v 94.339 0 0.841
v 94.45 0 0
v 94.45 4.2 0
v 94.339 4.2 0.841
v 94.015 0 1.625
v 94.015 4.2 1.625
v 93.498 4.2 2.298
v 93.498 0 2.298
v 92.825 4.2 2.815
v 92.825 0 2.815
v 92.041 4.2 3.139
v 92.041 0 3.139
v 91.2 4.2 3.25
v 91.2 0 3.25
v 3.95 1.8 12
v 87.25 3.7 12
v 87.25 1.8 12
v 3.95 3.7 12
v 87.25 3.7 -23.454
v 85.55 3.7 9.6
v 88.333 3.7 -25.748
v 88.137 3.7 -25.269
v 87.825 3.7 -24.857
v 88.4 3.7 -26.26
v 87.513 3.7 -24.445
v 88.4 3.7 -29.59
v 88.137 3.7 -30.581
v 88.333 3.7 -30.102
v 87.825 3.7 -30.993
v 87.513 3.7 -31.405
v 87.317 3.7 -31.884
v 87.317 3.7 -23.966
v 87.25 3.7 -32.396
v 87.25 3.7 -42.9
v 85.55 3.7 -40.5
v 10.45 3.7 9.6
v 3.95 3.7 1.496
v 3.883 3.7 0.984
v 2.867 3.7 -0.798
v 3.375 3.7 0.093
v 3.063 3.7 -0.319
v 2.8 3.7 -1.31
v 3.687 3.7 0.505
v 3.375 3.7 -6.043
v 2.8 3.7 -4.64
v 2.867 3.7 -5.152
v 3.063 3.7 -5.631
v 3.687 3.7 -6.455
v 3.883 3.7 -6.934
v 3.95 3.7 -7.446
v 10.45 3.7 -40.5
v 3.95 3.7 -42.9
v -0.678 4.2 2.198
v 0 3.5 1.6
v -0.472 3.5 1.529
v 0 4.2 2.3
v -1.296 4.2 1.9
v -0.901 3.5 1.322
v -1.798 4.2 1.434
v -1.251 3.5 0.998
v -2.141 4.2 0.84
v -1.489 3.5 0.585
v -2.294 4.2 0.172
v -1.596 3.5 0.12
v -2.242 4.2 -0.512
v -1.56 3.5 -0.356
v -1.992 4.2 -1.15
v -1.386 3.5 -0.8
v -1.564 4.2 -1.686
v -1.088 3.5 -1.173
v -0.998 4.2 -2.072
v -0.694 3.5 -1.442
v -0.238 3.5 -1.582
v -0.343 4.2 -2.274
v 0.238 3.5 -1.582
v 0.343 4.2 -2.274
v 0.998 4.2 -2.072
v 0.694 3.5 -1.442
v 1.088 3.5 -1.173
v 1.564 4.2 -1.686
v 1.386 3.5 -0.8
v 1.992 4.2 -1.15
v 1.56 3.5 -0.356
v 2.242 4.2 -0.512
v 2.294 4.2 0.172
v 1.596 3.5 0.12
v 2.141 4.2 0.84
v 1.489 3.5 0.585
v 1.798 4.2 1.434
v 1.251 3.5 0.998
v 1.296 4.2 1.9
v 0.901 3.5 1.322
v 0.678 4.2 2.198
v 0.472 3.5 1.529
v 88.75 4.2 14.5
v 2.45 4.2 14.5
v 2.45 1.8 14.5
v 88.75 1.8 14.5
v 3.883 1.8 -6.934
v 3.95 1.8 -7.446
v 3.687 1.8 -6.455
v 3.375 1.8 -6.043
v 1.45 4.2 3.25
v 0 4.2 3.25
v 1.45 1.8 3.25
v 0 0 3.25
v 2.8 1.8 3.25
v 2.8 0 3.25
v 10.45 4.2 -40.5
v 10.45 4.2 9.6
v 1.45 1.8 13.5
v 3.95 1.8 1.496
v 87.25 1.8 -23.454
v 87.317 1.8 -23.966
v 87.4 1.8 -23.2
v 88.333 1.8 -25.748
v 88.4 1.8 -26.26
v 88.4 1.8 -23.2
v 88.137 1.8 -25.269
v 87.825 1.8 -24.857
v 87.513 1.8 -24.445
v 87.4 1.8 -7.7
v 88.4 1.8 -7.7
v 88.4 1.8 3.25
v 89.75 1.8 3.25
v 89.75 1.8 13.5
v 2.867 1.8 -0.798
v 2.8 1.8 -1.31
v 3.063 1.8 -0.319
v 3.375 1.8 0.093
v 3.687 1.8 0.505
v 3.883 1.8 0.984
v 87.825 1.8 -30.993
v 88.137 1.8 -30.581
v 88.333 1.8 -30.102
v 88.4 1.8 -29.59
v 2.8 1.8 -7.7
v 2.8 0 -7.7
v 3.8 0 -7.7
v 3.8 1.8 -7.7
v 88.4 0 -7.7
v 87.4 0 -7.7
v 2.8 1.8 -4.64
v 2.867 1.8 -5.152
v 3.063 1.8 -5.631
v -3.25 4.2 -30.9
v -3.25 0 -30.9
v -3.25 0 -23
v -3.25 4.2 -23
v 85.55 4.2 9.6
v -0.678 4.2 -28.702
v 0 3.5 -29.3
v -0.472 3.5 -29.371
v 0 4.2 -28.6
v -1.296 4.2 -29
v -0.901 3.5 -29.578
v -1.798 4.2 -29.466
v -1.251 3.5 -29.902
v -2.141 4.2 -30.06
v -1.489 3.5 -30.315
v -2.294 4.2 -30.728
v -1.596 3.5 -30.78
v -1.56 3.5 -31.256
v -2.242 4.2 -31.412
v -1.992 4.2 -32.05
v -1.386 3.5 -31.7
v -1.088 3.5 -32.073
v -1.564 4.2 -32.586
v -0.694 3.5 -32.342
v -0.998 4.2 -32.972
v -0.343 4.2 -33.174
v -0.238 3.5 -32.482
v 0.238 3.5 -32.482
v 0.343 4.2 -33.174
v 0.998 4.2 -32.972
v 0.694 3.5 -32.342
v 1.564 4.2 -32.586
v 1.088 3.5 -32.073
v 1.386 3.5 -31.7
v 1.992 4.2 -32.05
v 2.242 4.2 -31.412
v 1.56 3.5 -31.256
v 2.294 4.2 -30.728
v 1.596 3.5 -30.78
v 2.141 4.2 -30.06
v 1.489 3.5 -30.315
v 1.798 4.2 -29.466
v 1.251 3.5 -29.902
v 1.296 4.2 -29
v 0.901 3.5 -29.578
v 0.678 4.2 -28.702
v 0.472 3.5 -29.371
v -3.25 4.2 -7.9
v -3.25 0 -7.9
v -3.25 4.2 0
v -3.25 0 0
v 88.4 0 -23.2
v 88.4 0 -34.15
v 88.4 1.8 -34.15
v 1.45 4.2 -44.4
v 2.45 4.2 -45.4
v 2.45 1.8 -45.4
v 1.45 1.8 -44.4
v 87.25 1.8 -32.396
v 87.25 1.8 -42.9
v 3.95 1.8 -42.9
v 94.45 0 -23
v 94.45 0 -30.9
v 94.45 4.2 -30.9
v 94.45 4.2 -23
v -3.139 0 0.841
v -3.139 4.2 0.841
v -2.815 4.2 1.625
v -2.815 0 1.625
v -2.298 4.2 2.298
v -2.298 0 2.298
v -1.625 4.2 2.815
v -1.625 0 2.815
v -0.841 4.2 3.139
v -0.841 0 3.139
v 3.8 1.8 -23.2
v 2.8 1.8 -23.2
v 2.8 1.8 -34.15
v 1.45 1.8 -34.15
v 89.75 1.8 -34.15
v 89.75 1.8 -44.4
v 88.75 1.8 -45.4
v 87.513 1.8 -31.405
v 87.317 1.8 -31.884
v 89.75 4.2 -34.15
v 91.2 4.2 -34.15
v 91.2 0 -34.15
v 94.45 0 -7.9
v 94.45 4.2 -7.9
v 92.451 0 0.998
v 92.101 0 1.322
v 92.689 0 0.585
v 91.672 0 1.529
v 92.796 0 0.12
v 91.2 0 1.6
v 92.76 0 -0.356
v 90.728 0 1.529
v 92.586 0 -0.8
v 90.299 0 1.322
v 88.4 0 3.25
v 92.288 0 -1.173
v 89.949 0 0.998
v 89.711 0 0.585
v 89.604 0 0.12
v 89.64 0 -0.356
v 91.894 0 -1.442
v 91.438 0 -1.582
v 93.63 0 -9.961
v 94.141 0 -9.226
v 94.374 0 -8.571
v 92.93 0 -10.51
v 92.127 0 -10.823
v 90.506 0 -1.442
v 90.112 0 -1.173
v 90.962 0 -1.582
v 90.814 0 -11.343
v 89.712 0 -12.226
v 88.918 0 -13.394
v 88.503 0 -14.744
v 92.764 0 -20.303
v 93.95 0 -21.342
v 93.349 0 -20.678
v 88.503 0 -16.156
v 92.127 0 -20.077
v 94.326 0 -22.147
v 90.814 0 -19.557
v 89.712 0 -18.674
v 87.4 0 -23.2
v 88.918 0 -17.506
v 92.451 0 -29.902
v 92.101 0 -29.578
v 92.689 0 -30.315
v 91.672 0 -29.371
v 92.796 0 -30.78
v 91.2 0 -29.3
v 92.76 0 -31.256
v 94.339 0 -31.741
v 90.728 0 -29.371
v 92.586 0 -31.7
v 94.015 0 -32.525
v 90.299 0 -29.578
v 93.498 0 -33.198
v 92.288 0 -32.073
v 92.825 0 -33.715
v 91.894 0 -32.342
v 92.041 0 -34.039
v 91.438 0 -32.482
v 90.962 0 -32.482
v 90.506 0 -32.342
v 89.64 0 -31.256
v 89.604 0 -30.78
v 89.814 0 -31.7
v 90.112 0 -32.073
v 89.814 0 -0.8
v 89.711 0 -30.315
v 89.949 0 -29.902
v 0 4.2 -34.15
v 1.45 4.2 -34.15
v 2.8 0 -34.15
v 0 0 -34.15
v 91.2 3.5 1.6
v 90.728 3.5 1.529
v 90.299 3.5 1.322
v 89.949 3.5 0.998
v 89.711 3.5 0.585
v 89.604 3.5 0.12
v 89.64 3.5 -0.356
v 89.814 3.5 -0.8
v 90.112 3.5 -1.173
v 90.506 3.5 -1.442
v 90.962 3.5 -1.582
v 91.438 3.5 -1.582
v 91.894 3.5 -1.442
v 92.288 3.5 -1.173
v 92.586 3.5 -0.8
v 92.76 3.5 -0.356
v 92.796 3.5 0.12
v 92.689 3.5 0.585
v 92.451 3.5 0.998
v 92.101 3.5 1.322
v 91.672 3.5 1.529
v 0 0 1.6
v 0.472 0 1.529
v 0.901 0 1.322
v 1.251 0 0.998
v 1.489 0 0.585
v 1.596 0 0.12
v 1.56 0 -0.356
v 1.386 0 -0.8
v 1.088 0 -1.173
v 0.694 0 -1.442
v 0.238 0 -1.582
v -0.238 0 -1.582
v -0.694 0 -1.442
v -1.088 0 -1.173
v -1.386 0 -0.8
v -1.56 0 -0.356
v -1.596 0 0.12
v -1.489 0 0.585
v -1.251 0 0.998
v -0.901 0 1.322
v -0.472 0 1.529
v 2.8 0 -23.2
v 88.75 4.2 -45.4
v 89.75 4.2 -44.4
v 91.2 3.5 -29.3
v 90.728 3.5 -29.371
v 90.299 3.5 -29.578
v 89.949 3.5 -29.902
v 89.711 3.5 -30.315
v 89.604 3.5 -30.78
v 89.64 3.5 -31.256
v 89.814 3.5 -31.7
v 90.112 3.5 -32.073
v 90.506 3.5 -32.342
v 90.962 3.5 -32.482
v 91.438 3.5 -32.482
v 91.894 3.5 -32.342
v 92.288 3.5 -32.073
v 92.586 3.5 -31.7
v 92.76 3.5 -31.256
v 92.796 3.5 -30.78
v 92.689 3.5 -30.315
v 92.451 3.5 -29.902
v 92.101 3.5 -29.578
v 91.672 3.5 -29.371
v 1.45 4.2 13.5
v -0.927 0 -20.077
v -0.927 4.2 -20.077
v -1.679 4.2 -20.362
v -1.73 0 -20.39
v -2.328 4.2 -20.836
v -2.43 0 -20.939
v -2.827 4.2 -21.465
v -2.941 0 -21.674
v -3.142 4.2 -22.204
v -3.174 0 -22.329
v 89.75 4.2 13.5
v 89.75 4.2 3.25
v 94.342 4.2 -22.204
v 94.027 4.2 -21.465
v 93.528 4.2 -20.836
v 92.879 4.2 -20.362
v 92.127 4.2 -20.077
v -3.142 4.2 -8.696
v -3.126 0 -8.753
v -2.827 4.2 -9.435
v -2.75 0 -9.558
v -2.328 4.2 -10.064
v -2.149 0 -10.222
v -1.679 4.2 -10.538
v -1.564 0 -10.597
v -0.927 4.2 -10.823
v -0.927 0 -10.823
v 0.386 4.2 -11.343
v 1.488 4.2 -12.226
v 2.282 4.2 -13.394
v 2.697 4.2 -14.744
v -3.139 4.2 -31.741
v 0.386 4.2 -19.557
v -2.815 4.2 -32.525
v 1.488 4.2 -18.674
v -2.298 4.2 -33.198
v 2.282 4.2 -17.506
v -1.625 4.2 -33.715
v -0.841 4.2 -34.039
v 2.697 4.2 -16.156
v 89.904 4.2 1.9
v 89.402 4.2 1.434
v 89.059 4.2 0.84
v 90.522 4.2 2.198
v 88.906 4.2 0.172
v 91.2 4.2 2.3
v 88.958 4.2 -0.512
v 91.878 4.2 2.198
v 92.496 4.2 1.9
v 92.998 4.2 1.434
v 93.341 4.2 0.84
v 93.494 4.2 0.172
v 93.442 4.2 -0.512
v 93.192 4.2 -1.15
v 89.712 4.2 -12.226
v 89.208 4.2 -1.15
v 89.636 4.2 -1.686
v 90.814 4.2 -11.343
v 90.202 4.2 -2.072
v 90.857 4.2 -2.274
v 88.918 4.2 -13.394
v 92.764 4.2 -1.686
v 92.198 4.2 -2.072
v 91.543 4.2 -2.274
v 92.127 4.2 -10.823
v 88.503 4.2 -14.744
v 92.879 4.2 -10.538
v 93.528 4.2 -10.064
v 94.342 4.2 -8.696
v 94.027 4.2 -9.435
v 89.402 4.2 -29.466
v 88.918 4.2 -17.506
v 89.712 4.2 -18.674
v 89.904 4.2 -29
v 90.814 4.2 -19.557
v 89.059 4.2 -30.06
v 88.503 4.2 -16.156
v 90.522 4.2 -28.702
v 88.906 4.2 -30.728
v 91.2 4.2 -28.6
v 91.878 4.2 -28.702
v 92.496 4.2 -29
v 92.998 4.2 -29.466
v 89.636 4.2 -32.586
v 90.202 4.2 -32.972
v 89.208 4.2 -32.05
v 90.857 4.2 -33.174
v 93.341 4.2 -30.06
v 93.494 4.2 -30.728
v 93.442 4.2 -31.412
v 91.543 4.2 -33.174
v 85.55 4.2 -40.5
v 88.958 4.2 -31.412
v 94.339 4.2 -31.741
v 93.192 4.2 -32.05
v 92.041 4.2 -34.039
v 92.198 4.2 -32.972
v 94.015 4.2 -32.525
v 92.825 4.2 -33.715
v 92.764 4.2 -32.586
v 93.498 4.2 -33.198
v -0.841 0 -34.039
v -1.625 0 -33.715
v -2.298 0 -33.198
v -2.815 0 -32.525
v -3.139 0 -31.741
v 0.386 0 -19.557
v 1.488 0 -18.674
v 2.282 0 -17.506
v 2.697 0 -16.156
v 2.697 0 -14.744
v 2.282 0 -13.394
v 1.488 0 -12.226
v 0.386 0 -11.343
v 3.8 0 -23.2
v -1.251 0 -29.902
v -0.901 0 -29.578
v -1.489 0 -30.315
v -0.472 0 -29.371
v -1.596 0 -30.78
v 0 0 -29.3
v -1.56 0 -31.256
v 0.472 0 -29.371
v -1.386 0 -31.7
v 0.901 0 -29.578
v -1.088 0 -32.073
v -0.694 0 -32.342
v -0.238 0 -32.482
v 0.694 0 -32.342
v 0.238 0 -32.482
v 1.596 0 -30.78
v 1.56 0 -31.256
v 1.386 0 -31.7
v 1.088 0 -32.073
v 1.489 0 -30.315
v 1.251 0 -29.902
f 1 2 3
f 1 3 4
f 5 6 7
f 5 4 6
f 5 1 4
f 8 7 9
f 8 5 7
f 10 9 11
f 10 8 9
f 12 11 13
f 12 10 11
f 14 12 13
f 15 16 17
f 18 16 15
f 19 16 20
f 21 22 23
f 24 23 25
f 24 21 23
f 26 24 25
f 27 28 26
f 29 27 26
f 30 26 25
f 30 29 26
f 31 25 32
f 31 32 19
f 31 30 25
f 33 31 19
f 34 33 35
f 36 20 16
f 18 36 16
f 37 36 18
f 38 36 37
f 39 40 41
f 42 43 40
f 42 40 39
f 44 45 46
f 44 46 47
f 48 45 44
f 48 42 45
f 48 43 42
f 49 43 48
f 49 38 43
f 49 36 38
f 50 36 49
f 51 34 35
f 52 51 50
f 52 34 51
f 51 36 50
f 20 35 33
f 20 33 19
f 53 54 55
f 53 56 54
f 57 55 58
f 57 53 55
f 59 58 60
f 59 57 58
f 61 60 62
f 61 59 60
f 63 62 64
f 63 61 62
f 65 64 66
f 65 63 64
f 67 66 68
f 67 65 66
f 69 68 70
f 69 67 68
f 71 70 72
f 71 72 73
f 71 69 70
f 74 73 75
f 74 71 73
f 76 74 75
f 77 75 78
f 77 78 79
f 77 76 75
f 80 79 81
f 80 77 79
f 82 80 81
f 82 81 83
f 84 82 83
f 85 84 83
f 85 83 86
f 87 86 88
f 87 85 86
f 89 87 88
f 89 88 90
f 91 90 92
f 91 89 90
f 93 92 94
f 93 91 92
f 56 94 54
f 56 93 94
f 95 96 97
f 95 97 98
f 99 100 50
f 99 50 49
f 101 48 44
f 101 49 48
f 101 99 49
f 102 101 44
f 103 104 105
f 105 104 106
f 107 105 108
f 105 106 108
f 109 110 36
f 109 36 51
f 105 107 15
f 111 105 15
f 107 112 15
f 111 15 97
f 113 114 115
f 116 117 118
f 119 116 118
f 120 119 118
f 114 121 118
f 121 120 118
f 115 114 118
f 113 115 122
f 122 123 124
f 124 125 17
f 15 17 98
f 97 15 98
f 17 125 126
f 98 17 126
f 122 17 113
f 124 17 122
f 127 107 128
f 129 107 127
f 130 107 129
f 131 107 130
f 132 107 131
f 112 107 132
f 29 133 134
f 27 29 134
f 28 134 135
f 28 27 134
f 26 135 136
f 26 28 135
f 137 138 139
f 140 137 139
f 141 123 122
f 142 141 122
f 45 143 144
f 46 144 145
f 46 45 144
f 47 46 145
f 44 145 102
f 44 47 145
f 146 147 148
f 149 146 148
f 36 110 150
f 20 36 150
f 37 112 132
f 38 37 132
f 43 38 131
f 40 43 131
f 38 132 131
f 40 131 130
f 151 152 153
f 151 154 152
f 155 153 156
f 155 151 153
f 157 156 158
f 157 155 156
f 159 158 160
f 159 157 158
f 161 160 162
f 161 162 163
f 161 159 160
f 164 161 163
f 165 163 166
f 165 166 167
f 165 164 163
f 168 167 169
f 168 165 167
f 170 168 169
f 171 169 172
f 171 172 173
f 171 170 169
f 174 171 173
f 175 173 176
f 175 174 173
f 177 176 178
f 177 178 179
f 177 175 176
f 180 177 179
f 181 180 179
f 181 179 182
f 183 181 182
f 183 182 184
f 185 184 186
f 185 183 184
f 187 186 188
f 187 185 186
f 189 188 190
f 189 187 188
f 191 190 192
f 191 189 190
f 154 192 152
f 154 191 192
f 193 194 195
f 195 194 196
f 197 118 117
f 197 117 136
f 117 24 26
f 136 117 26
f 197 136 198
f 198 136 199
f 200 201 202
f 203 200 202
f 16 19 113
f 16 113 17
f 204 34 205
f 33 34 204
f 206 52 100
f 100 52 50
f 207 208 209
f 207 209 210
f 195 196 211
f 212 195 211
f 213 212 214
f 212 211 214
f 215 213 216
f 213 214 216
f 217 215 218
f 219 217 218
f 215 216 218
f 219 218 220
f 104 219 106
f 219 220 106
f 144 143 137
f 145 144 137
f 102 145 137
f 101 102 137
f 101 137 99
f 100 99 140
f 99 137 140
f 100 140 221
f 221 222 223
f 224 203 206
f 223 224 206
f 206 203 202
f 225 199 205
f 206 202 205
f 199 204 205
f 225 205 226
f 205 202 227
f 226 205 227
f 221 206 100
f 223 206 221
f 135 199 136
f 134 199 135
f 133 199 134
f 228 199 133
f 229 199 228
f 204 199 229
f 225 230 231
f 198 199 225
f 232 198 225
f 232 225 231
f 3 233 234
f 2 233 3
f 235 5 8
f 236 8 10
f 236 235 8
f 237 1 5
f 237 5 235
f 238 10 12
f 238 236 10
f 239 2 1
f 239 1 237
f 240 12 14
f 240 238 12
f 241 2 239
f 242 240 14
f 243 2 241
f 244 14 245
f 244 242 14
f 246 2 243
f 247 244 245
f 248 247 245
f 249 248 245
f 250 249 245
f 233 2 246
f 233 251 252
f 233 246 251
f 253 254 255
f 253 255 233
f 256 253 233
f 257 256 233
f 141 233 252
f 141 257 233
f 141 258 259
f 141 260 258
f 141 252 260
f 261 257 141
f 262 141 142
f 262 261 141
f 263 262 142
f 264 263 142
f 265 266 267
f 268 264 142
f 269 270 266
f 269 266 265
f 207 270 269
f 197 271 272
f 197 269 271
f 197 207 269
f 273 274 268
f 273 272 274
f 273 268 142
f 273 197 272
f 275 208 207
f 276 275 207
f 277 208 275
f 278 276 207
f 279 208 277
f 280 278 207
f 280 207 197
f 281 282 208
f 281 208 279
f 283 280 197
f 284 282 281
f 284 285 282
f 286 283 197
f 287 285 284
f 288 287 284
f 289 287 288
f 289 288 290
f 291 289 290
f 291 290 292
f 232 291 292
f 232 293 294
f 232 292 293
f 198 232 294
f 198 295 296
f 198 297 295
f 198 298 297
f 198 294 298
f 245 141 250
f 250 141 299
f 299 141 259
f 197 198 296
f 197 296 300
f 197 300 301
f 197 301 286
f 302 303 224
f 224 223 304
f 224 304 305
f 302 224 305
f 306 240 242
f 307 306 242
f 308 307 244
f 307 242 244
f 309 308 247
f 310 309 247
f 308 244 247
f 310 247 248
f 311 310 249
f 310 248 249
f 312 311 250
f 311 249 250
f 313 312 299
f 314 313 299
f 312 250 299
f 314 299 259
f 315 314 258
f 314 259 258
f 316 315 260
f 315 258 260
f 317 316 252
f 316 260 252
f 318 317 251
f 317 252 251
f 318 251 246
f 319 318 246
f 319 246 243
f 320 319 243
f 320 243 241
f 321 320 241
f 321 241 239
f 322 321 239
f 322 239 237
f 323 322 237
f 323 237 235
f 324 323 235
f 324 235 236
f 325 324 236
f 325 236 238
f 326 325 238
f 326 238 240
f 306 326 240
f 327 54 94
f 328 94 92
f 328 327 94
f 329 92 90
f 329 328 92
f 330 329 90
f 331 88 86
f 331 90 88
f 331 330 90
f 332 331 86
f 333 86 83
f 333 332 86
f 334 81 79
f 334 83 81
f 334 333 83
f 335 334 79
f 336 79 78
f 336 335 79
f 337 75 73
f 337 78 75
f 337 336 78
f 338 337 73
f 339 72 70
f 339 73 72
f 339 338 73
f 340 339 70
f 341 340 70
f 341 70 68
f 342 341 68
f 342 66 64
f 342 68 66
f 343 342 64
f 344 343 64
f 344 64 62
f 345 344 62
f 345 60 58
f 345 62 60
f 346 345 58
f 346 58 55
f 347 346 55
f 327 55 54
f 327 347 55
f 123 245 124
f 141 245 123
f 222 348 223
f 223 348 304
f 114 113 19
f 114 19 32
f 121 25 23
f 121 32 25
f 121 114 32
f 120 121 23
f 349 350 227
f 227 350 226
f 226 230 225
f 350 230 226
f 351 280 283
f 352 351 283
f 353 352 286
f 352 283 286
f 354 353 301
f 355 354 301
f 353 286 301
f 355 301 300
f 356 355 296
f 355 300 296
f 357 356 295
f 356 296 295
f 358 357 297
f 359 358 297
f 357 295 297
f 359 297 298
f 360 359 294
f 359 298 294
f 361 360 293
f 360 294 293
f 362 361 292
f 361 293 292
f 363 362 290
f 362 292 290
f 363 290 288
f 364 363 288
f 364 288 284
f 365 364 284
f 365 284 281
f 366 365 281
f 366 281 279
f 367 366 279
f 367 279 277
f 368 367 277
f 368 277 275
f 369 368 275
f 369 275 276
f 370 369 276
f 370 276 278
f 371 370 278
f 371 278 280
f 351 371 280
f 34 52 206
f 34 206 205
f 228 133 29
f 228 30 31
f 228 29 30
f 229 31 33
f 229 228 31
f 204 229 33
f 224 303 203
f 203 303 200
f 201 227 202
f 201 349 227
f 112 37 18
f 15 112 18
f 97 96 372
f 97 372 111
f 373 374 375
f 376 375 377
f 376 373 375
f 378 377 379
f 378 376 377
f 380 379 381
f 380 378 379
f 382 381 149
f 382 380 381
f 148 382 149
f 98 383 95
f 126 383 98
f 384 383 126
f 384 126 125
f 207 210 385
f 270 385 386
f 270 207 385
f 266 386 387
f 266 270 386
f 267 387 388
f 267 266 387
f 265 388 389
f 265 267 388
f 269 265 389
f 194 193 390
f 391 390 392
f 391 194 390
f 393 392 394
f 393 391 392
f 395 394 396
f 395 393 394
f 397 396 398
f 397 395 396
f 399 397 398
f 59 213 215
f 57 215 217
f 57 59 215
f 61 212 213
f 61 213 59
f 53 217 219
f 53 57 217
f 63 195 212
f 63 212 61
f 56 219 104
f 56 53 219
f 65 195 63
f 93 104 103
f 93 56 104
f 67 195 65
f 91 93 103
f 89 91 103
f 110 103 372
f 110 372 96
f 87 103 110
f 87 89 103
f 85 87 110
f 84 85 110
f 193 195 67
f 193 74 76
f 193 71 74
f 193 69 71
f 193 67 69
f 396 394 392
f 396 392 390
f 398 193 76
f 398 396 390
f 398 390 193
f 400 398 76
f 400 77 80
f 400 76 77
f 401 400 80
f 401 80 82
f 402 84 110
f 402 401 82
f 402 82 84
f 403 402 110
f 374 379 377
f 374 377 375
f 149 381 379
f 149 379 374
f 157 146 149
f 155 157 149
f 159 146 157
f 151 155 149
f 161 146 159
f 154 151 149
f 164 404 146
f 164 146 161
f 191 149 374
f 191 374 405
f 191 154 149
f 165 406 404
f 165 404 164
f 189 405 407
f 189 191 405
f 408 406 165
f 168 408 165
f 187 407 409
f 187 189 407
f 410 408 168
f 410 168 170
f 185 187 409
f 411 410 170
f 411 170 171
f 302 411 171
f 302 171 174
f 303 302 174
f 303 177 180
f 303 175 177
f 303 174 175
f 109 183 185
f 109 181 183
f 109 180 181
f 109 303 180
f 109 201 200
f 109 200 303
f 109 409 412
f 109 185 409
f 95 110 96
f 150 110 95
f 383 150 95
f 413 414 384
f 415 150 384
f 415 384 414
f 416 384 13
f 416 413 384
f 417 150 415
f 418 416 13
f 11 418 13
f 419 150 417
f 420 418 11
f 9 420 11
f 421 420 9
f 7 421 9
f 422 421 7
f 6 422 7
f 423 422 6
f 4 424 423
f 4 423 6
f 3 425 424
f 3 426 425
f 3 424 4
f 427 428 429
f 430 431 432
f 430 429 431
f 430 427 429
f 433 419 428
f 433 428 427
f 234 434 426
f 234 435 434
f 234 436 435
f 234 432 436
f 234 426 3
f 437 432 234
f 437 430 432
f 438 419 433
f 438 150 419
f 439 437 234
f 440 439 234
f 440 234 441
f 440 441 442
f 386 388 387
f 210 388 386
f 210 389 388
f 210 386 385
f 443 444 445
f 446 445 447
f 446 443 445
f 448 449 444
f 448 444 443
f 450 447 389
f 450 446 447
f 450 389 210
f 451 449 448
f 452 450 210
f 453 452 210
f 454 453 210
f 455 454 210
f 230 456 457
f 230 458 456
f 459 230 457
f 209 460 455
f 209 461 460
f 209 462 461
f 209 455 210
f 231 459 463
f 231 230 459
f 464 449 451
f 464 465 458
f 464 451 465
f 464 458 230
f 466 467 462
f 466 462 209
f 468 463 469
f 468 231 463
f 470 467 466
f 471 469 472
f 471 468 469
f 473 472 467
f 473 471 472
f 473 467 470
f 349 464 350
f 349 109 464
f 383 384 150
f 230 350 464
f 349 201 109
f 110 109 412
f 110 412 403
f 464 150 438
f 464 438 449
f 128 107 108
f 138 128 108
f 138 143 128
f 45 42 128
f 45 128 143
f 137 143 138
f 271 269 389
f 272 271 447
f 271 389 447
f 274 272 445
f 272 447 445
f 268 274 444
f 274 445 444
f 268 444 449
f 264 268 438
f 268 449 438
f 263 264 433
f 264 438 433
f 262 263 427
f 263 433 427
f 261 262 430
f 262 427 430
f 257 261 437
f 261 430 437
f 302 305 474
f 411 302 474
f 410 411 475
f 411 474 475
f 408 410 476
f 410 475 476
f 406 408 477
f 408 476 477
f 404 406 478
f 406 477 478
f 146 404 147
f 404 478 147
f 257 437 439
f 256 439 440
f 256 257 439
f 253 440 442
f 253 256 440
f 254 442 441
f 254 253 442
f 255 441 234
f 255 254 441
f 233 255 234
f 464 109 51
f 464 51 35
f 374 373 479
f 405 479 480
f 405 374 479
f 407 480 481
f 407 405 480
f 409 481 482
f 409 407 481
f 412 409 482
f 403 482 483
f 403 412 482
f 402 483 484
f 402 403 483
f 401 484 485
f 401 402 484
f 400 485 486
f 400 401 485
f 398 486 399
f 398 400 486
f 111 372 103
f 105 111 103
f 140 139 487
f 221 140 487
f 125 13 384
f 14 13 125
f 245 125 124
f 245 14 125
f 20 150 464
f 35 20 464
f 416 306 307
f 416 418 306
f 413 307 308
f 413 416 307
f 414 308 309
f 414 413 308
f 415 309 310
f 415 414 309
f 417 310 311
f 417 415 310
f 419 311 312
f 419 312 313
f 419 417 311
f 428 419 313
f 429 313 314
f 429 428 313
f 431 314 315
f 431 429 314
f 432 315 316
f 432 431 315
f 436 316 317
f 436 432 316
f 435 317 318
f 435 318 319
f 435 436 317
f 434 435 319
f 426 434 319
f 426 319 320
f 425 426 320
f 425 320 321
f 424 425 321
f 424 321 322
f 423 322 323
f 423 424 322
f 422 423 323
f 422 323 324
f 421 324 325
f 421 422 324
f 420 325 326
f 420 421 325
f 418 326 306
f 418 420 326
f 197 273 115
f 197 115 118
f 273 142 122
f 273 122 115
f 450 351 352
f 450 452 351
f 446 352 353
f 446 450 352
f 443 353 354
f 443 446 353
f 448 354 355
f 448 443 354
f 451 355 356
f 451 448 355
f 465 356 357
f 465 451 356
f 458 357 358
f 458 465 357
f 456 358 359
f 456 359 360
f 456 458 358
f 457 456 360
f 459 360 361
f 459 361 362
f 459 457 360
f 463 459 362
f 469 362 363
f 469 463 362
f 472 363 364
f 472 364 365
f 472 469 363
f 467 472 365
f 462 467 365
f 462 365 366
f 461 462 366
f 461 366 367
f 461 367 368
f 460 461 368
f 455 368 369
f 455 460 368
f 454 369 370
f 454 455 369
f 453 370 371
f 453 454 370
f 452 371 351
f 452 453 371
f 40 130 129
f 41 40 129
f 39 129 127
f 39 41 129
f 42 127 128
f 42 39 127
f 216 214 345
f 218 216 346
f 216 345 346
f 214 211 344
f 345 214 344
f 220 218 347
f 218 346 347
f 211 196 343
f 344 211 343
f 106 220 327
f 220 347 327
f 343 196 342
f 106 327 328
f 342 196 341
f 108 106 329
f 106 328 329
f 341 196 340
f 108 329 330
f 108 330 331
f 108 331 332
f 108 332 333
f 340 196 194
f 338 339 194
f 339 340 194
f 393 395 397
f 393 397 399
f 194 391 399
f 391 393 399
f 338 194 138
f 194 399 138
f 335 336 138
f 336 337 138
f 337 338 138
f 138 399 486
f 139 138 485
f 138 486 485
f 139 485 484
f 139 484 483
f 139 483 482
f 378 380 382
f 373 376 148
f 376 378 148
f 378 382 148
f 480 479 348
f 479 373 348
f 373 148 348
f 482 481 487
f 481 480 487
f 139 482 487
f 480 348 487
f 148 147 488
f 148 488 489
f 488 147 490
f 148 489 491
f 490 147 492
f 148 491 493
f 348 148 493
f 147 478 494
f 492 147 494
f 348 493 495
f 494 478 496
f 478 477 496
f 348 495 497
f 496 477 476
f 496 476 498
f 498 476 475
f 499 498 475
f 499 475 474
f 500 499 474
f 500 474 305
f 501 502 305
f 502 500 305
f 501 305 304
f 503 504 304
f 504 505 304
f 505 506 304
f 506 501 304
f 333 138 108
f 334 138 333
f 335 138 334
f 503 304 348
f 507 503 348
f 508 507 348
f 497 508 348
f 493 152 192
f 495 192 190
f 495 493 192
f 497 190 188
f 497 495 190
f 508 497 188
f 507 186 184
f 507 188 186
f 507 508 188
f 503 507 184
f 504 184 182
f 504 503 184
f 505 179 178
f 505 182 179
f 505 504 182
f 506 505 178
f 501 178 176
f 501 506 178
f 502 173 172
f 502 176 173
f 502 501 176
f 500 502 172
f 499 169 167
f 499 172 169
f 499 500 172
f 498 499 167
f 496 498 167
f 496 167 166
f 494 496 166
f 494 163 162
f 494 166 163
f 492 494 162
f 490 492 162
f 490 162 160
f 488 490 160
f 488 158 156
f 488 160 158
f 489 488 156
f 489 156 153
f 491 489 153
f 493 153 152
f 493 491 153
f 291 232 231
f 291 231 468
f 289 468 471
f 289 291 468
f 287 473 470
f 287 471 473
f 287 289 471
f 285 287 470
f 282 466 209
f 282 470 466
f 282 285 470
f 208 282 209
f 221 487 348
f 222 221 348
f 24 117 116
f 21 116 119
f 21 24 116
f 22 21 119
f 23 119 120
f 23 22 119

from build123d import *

# Parameters (mm, degrees)
CROQUIS1_R              = 1.6
SALIENTE_EXTRUIR1_DEPTH = 4.5
SALIENTE_EXTRUIR2_DEPTH = 2.7
CORTAR_EXTRUIR1_DEPTH   = 65.504030882
REDONDEO1_R             = 3
CHAFL_N1_SIZE           = 1
CROQUIS6_W              = 1.15
CROQUIS6_H              = 6.95
CORTAR_EXTRUIR3_DEPTH   = 105.891432104
REDONDEO4_R             = 2
REDONDEO5_R             = 2
CROQUIS7_R              = 1.6
CORTAR_EXTRUIR4_DEPTH   = 105.891432104
CHAFL_N2_SIZE           = 1
CROQUIS8_W              = 75.1
CROQUIS8_H              = 50.1
SALIENTE_EXTRUIR4_DEPTH = 0.8
MOVER_START             = 4.2
MOVER_CARA1_OUTLINE_W   = 75.1
MOVER_CARA1_OUTLINE_H   = 50.1
MOVER_CARA1_DEPTH       = 0.3


# Read off the part's stored shape, not the designer's step: Mover cara1
with BuildPart() as part:
    # Croquis1 → Saliente-Extruir1 (new body)
    with BuildSketch(Plane(origin=(0, 0, 0), x_dir=(1, 0, 0), z_dir=(0, 1, 0))):
        with BuildLine():
            Line((-3.25, 30.9), (-3.25, 0))
            ThreePointArc((-3.25, 0), (-2.298097039, -2.298097039), (0, -3.25))
            Line((0, -3.25), (2.8, -3.25))
            Line((2.8, -3.25), (2.8, 7.7))
            Line((2.8, 7.7), (3.8, 7.7))
            Line((3.8, 7.7), (3.8, 23.2))
            Line((3.8, 23.2), (2.8, 23.2))
            Line((2.8, 23.2), (2.8, 34.15))
            Line((2.8, 34.15), (0, 34.15))
            ThreePointArc((0, 34.15), (-2.298097039, 33.198097039), (-3.25, 30.9))
        make_face()
        with Locations(Location((0, 0, 0), (0, 0, 270))):
            Circle(CROQUIS1_R, mode=Mode.SUBTRACT)
        with Locations(Location((0, 30.9, 0), (0, 0, 270))):
            Circle(CROQUIS1_R, mode=Mode.SUBTRACT)
    extrude(amount=SALIENTE_EXTRUIR1_DEPTH)

    # Croquis2 → Saliente-Extruir2 (add)
    with BuildSketch(Plane(origin=(0, 4.5, 0), x_dir=(1, 0, 0), z_dir=(0, 1, 0))):
        Polygon((45.6, -14.5), (1.45, -14.5), (1.45, 45.4), (45.6, 45.4), (45.6, 42.9), (3.95, 42.9), (3.95, -12), (45.6, -12), align=None)
    extrude(amount=-SALIENTE_EXTRUIR2_DEPTH)

    # Croquis3 → Cortar-Extruir1 (cut, through all)
    with BuildSketch(Plane(origin=(0, 4.5, 0), x_dir=(1, 0, 0), z_dir=(0, 1, 0))):
        with BuildLine():
            Line((-2, 10.7), (-3.25, 10.7))
            Line((-3.25, 10.7), (-3.25, 20.2))
            Line((-3.25, 20.2), (-2, 20.2))
            ThreePointArc((-2, 20.2), (2.75, 15.45), (-2, 10.7))
        make_face()
    extrude(amount=-CORTAR_EXTRUIR1_DEPTH, mode=Mode.SUBTRACT)

    # Simetría1: part across plane


with BuildPart() as part_1:
    add(part.part)
    add(part.part.mirror(Plane(origin=(45.6, -74.412582941, 12), x_dir=(0, 0, 1), z_dir=(1, 0, 0))))

    # Redondeo1
    redondeo1_edges = [part_1.edges().sort_by_distance(p)[0] for p in [
        (94.45, 2.25, -20.2),
        (94.45, 2.25, -10.7),
        (-3.25, 2.25, -20.2),
        (-3.25, 2.25, -10.7),
    ]]
    fillet(redondeo1_edges, radius=REDONDEO1_R)

    # Chaflán1
    chafl_n1_edges = [part_1.edges().sort_by_distance(p)[0] for p in [
        (89.75, 3.15, -45.4),
        (89.75, 3.15, 14.5),
        (1.45, 3.15, 14.5),
        (1.45, 3.15, -45.4),
    ]]
    chamfer(chafl_n1_edges, length=CHAFL_N1_SIZE)

    # Croquis6 → Cortar-Extruir3 (cut, through all)
    with BuildSketch(Plane(origin=(0, 4.5, 0), x_dir=(1, 0, 0), z_dir=(0, 1, 0))):
        with Locations((3.375, 2.975)):
            Rectangle(CROQUIS6_W, CROQUIS6_H)
        with Locations((87.825, 27.925)):
            Rectangle(CROQUIS6_W, CROQUIS6_H)
    extrude(amount=-CORTAR_EXTRUIR3_DEPTH, mode=Mode.SUBTRACT)

    # Redondeo4
    # the kernel refuses this fillet: 2 mm, written as the material it adds along each edge
    with BuildSketch(Plane(origin=(88.4, 4.5, -24.45), x_dir=(0, 0, -1), z_dir=(0, -1, 0)), Plane(origin=(2.8, 4.5, -6.45), x_dir=(0, 0, 1), z_dir=(0, -1, 0))) as redondeo4_piece_1:
        with BuildLine():
            CenterArc((1.810386699, -2), REDONDEO4_R, 90, 64.849336587)
            Line((0, -1.15), (-0.036207734, -1.133))
            ThreePointArc((-0.036207734, -1.133), (-0.04, -0.575), (-0.04, 0))
            Line((-0.04, 0), (0, 0.04))
            Line((0, 0.04), (1.810386699, 0.04))
            Line((1.810386699, 0.04), (1.810386699, 0))
        make_face()
    extrude(amount=2.7)
    with BuildSketch(Plane(origin=(88.4, 4.5, -31.4), x_dir=(-1, 0, 0), z_dir=(0, -1, 0)), Plane(origin=(2.8, 4.5, 0.5), x_dir=(1, 0, 0), z_dir=(0, -1, 0))) as redondeo4_piece_2:
        with BuildLine():
            CenterArc((2, -1.810386699), REDONDEO4_R, 115.150663413, 64.849336587)
            Line((0, -1.810386699), (-0.04, -1.810386699))
            Line((-0.04, -1.810386699), (-0.04, 0))
            Line((-0.04, 0), (0, 0.04))
            ThreePointArc((0, 0.04), (0.575, 0.04), (1.133, 0.036207734))
            Line((1.133, 0.036207734), (1.15, 0))
        make_face()
    extrude(amount=2.7)

    # Redondeo5
    redondeo5_edges = [part_1.edges().sort_by_distance(p)[0] for p in [
        (3.95, 3.15, 0.5),
        (3.95, 3.15, -6.45),
        (87.25, 3.15, -31.4),
        (87.25, 3.15, -24.45),
    ]]
    fillet(redondeo5_edges, radius=REDONDEO5_R)

    # Croquis7 → Cortar-Extruir4 (cut, through all)
    with BuildSketch(Plane.XZ):
        with Locations(Location((0, -30.9, 0), (0, 0, 90))):
            Circle(CROQUIS7_R)
        with Locations(Location((0, 0, 0), (0, 0, 90))):
            Circle(CROQUIS7_R)
        with Locations(Location((91.2, -30.9, 0), (0, 0, 90))):
            Circle(CROQUIS7_R)
        with Locations(Location((91.2, 0, 0), (0, 0, 90))):
            Circle(CROQUIS7_R)
    extrude(amount=-CORTAR_EXTRUIR4_DEPTH, mode=Mode.SUBTRACT)

    # Chaflán2
    chafl_n2_edges = [part_1.edges().sort_by_distance(p)[0] for p in [
        (91.2, 4.5, -32.5),
        (91.2, 4.5, -1.6),
        (0, 4.5, -32.5),
        (0, 4.5, -1.6),
    ]]
    chamfer(chafl_n2_edges, length=CHAFL_N2_SIZE)

    # Croquis8 → Saliente-Extruir4 (add)
    with BuildSketch(Plane(origin=(0, 4.5, 0), x_dir=(1, 0, 0), z_dir=(0, 1, 0))):
        with BuildLine():
            Line((3.95, 42.9), (87.25, 42.9))
            Line((87.25, 42.9), (87.25, 32.396301741))
            ThreePointArc((87.25, 32.396301741), (87.399324448, 31.638014197), (87.825, 30.992957521))
            ThreePointArc((87.825, 30.992957521), (88.250675552, 30.347900845), (88.4, 29.589613301))
            Line((88.4, 29.589613301), (88.4, 26.260386699))
            ThreePointArc((88.4, 26.260386699), (88.250675552, 25.502099155), (87.825, 24.857042479))
            ThreePointArc((87.825, 24.857042479), (87.399324448, 24.211985803), (87.25, 23.453698259))
            Line((87.25, 23.453698259), (87.25, -12))
            Line((87.25, -12), (3.95, -12))
            Line((3.95, -12), (3.95, -1.496301741))
            ThreePointArc((3.95, -1.496301741), (3.800675552, -0.738014197), (3.375, -0.092957521))
            ThreePointArc((3.375, -0.092957521), (2.949324448, 0.552099155), (2.8, 1.310386699))
            Line((2.8, 1.310386699), (2.8, 4.639613301))
            ThreePointArc((2.8, 4.639613301), (2.949324448, 5.397900845), (3.375, 6.042957521))
            ThreePointArc((3.375, 6.042957521), (3.800675552, 6.688014197), (3.95, 7.446301741))
            Line((3.95, 7.446301741), (3.95, 42.9))
        make_face()
        with Locations((48, 15.45)):
            Rectangle(CROQUIS8_W, CROQUIS8_H, mode=Mode.SUBTRACT)
    extrude(amount=-SALIENTE_EXTRUIR4_DEPTH)

    # Mover cara1 outline → Mover cara1 (cut)
    with BuildSketch(Plane(origin=(0, 0, 0), x_dir=(1, 0, 0), z_dir=(0, 1, 0)).offset(MOVER_START)):
        with BuildLine():
            Line((0, -3.25), (1.45, -3.25))
            Line((1.45, -3.25), (1.45, -13.5))
            Line((1.45, -13.5), (2.45, -14.5))
            Line((2.45, -14.5), (88.75, -14.5))
            Line((88.75, -14.5), (89.75, -13.5))
            Line((89.75, -13.5), (89.75, -3.25))
            Line((89.75, -3.25), (91.2, -3.25))
            ThreePointArc((91.2, -3.25), (93.498097039, -2.298097039), (94.45, 0))
            Line((94.45, 0), (94.45, 7.900165565))
            ThreePointArc((94.45, 7.900165565), (93.798644084, 9.766678615), (92.127419355, 10.82268212))
            ThreePointArc((92.127419355, 10.82268212), (88.45, 15.45), (92.127419355, 20.07731788))
            ThreePointArc((92.127419355, 20.07731788), (93.798644084, 21.133321385), (94.45, 22.999834435))
            Line((94.45, 22.999834435), (94.45, 30.9))
            ThreePointArc((94.45, 30.9), (93.498097039, 33.198097039), (91.2, 34.15))
            Line((91.2, 34.15), (89.75, 34.15))
            Line((89.75, 34.15), (89.75, 44.4))
            Line((89.75, 44.4), (88.75, 45.4))
            Line((88.75, 45.4), (2.45, 45.4))
            Line((2.45, 45.4), (1.45, 44.4))
            Line((1.45, 44.4), (1.45, 34.15))
            Line((1.45, 34.15), (0, 34.15))
            ThreePointArc((0, 34.15), (-2.298097039, 33.198097039), (-3.25, 30.9))
            Line((-3.25, 30.9), (-3.25, 22.999834435))
            ThreePointArc((-3.25, 22.999834435), (-2.598644084, 21.133321385), (-0.927419355, 20.07731788))
            ThreePointArc((-0.927419355, 20.07731788), (2.75, 15.45), (-0.927419355, 10.82268212))
            ThreePointArc((-0.927419355, 10.82268212), (-2.598644084, 9.766678615), (-3.25, 7.900165565))
            Line((-3.25, 7.900165565), (-3.25, 0))
            ThreePointArc((-3.25, 0), (-2.298097039, -2.298097039), (0, -3.25))
        make_face()
        with Locations((48, 15.45)):
            Rectangle(MOVER_CARA1_OUTLINE_W, MOVER_CARA1_OUTLINE_H, mode=Mode.SUBTRACT)
    extrude(amount=MOVER_CARA1_DEPTH, mode=Mode.SUBTRACT)


solid = part_1.part
